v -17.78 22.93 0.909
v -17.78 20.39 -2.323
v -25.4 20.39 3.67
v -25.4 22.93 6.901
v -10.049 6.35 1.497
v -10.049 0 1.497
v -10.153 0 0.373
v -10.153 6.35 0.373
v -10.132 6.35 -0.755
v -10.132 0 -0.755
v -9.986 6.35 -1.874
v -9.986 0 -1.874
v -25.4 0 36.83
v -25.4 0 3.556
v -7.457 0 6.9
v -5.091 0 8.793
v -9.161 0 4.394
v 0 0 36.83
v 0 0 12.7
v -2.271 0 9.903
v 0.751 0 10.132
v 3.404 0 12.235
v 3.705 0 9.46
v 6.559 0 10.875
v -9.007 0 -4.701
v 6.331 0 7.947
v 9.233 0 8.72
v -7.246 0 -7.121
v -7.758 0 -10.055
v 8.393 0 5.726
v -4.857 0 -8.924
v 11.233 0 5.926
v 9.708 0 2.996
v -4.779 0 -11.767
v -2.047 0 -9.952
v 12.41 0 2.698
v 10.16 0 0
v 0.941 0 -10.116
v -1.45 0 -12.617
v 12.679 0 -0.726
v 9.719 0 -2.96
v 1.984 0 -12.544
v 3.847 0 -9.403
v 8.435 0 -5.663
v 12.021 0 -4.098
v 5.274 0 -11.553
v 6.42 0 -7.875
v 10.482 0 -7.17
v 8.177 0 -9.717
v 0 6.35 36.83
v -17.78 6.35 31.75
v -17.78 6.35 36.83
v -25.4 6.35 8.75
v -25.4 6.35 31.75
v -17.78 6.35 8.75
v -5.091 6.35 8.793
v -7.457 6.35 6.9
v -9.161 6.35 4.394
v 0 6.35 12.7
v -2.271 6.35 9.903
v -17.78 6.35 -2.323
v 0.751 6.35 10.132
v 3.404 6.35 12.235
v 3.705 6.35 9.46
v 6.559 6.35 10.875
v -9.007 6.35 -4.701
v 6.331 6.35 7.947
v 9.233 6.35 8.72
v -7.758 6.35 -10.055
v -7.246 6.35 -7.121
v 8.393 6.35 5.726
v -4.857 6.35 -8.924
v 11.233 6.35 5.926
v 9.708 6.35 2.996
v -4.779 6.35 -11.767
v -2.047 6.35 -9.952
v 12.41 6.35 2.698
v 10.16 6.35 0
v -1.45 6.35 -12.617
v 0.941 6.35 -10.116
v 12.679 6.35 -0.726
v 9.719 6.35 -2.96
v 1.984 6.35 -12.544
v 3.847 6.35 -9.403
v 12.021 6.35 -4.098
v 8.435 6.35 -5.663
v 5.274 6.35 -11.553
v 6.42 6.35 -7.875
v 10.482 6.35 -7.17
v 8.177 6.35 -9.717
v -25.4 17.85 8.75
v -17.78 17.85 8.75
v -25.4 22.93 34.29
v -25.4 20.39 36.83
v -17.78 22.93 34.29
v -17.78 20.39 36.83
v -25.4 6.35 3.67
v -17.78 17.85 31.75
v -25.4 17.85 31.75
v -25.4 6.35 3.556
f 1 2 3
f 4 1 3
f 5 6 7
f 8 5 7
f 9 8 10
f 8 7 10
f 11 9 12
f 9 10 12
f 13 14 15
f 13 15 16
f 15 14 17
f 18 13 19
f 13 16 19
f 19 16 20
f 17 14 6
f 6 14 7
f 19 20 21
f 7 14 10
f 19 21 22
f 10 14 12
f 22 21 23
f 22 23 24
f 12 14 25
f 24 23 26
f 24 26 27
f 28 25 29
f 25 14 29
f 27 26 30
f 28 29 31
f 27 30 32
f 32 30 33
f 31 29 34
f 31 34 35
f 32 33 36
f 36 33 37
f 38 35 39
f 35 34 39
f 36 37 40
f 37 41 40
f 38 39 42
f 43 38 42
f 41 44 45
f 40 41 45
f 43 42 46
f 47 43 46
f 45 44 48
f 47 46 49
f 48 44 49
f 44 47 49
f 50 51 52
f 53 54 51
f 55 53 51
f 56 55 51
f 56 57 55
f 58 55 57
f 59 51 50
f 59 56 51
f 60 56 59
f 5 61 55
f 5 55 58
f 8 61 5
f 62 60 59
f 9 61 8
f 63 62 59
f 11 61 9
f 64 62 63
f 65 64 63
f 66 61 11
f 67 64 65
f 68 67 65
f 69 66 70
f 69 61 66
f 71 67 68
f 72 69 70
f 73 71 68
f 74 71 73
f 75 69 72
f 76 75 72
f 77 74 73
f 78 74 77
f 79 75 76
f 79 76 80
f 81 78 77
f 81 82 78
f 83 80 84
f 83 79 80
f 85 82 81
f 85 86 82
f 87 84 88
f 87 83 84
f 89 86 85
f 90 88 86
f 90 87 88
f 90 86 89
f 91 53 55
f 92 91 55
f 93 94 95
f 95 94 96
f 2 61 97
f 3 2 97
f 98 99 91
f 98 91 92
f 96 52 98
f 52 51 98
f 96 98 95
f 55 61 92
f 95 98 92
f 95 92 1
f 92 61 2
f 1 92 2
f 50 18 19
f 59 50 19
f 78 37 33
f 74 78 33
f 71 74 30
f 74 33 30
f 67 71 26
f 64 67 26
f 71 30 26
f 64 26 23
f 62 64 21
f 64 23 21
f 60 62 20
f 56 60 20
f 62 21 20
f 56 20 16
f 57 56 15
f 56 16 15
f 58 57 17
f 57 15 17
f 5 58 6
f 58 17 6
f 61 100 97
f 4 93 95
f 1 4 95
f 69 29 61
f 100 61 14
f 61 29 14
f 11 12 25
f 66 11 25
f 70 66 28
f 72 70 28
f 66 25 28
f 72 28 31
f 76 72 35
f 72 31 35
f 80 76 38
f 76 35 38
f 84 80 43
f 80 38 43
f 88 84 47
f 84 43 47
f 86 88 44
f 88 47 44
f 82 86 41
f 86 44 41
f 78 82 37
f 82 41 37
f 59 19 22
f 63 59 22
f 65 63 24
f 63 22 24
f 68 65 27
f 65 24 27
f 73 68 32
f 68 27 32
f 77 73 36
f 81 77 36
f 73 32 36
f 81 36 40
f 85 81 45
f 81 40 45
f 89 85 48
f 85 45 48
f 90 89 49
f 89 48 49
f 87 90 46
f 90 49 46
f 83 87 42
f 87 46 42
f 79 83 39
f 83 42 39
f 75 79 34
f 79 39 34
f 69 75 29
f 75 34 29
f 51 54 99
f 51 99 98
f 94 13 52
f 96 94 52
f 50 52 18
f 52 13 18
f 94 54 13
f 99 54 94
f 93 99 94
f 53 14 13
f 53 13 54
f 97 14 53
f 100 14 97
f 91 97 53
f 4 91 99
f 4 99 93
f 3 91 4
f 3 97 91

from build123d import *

# Parameters (mm, degrees)
BOSS_EXTRUDE1_DEPTH = 6.35
SKETCH6_W           = 7.62
SKETCH6_H           = 5.08
BOSS_EXTRUDE3_DEPTH = 16.58
SKETCH8_W           = 7.62
SKETCH8_H           = 5.08
BOSS_EXTRUDE4_DEPTH = 23
CHAMFER1_SIZE       = 2.54


with BuildPart() as part:
    # Sketch1 → Boss-Extrude1 (new body)
    with BuildSketch(Plane(origin=(0, 0, 0), x_dir=(1, 0, 0), z_dir=(0, 1, 0))):
        with BuildLine():
            Line((0, -36.83), (0, -12.7))
            ThreePointArc((0, -12.7), (12.020636157, 4.098085697), (-7.757731828, 10.055227341))
            Line((-7.757731828, 10.055227341), (-25.4, -3.556))
            Line((-25.4, -3.556), (-25.4, -17.326729584))
            Line((-25.4, -17.326729584), (-25.4, -17.78))
            Line((-25.4, -17.78), (-25.4, -36.83))
            Line((-25.4, -36.83), (0, -36.83))
        make_face()
        with BuildLine():
            ThreePointArc((10.16, 0), (0.750509795, -10.13224235), (-10.049121072, -1.496918727))
            ThreePointArc((-10.049121072, -1.496918727), (-10.15820415, 0.191019487), (-9.985739115, 1.873663342))
            ThreePointArc((-9.985739115, 1.873663342), (0.940874749, 10.116340974), (10.16, 0))
        make_face(mode=Mode.SUBTRACT)
    extrude(amount=BOSS_EXTRUDE1_DEPTH)

    # Sketch6 → Boss-Extrude3 (add)
    with BuildSketch(Plane(origin=(0, 6.35, 0), x_dir=(1, 0, 0), z_dir=(0, 1, 0))):
        Polygon((-17.78, -3.67), (-17.78, 2.322923919), (-25.4, -3.67), align=None)
        with Locations((-21.59, -6.21)):
            Rectangle(SKETCH6_W, SKETCH6_H)
        with Locations((-21.59, -34.29)):
            Rectangle(SKETCH6_W, SKETCH6_H)
    extrude(amount=BOSS_EXTRUDE3_DEPTH)

    # Sketch8 → Boss-Extrude4 (add)
    with BuildSketch(Plane.XY.offset(8.75)):
        with Locations((-21.59, 20.39)):
            Rectangle(SKETCH8_W, SKETCH8_H)
    extrude(amount=BOSS_EXTRUDE4_DEPTH)

    # Chamfer1
    chamfer1_edges = [part.edges().sort_by_distance(p)[0] for p in [
        (-21.59, 22.93, 0.673538041),
        (-21.59, 22.93, 36.83),
    ]]
    chamfer(chamfer1_edges, length=CHAMFER1_SIZE)


solid = part.part
